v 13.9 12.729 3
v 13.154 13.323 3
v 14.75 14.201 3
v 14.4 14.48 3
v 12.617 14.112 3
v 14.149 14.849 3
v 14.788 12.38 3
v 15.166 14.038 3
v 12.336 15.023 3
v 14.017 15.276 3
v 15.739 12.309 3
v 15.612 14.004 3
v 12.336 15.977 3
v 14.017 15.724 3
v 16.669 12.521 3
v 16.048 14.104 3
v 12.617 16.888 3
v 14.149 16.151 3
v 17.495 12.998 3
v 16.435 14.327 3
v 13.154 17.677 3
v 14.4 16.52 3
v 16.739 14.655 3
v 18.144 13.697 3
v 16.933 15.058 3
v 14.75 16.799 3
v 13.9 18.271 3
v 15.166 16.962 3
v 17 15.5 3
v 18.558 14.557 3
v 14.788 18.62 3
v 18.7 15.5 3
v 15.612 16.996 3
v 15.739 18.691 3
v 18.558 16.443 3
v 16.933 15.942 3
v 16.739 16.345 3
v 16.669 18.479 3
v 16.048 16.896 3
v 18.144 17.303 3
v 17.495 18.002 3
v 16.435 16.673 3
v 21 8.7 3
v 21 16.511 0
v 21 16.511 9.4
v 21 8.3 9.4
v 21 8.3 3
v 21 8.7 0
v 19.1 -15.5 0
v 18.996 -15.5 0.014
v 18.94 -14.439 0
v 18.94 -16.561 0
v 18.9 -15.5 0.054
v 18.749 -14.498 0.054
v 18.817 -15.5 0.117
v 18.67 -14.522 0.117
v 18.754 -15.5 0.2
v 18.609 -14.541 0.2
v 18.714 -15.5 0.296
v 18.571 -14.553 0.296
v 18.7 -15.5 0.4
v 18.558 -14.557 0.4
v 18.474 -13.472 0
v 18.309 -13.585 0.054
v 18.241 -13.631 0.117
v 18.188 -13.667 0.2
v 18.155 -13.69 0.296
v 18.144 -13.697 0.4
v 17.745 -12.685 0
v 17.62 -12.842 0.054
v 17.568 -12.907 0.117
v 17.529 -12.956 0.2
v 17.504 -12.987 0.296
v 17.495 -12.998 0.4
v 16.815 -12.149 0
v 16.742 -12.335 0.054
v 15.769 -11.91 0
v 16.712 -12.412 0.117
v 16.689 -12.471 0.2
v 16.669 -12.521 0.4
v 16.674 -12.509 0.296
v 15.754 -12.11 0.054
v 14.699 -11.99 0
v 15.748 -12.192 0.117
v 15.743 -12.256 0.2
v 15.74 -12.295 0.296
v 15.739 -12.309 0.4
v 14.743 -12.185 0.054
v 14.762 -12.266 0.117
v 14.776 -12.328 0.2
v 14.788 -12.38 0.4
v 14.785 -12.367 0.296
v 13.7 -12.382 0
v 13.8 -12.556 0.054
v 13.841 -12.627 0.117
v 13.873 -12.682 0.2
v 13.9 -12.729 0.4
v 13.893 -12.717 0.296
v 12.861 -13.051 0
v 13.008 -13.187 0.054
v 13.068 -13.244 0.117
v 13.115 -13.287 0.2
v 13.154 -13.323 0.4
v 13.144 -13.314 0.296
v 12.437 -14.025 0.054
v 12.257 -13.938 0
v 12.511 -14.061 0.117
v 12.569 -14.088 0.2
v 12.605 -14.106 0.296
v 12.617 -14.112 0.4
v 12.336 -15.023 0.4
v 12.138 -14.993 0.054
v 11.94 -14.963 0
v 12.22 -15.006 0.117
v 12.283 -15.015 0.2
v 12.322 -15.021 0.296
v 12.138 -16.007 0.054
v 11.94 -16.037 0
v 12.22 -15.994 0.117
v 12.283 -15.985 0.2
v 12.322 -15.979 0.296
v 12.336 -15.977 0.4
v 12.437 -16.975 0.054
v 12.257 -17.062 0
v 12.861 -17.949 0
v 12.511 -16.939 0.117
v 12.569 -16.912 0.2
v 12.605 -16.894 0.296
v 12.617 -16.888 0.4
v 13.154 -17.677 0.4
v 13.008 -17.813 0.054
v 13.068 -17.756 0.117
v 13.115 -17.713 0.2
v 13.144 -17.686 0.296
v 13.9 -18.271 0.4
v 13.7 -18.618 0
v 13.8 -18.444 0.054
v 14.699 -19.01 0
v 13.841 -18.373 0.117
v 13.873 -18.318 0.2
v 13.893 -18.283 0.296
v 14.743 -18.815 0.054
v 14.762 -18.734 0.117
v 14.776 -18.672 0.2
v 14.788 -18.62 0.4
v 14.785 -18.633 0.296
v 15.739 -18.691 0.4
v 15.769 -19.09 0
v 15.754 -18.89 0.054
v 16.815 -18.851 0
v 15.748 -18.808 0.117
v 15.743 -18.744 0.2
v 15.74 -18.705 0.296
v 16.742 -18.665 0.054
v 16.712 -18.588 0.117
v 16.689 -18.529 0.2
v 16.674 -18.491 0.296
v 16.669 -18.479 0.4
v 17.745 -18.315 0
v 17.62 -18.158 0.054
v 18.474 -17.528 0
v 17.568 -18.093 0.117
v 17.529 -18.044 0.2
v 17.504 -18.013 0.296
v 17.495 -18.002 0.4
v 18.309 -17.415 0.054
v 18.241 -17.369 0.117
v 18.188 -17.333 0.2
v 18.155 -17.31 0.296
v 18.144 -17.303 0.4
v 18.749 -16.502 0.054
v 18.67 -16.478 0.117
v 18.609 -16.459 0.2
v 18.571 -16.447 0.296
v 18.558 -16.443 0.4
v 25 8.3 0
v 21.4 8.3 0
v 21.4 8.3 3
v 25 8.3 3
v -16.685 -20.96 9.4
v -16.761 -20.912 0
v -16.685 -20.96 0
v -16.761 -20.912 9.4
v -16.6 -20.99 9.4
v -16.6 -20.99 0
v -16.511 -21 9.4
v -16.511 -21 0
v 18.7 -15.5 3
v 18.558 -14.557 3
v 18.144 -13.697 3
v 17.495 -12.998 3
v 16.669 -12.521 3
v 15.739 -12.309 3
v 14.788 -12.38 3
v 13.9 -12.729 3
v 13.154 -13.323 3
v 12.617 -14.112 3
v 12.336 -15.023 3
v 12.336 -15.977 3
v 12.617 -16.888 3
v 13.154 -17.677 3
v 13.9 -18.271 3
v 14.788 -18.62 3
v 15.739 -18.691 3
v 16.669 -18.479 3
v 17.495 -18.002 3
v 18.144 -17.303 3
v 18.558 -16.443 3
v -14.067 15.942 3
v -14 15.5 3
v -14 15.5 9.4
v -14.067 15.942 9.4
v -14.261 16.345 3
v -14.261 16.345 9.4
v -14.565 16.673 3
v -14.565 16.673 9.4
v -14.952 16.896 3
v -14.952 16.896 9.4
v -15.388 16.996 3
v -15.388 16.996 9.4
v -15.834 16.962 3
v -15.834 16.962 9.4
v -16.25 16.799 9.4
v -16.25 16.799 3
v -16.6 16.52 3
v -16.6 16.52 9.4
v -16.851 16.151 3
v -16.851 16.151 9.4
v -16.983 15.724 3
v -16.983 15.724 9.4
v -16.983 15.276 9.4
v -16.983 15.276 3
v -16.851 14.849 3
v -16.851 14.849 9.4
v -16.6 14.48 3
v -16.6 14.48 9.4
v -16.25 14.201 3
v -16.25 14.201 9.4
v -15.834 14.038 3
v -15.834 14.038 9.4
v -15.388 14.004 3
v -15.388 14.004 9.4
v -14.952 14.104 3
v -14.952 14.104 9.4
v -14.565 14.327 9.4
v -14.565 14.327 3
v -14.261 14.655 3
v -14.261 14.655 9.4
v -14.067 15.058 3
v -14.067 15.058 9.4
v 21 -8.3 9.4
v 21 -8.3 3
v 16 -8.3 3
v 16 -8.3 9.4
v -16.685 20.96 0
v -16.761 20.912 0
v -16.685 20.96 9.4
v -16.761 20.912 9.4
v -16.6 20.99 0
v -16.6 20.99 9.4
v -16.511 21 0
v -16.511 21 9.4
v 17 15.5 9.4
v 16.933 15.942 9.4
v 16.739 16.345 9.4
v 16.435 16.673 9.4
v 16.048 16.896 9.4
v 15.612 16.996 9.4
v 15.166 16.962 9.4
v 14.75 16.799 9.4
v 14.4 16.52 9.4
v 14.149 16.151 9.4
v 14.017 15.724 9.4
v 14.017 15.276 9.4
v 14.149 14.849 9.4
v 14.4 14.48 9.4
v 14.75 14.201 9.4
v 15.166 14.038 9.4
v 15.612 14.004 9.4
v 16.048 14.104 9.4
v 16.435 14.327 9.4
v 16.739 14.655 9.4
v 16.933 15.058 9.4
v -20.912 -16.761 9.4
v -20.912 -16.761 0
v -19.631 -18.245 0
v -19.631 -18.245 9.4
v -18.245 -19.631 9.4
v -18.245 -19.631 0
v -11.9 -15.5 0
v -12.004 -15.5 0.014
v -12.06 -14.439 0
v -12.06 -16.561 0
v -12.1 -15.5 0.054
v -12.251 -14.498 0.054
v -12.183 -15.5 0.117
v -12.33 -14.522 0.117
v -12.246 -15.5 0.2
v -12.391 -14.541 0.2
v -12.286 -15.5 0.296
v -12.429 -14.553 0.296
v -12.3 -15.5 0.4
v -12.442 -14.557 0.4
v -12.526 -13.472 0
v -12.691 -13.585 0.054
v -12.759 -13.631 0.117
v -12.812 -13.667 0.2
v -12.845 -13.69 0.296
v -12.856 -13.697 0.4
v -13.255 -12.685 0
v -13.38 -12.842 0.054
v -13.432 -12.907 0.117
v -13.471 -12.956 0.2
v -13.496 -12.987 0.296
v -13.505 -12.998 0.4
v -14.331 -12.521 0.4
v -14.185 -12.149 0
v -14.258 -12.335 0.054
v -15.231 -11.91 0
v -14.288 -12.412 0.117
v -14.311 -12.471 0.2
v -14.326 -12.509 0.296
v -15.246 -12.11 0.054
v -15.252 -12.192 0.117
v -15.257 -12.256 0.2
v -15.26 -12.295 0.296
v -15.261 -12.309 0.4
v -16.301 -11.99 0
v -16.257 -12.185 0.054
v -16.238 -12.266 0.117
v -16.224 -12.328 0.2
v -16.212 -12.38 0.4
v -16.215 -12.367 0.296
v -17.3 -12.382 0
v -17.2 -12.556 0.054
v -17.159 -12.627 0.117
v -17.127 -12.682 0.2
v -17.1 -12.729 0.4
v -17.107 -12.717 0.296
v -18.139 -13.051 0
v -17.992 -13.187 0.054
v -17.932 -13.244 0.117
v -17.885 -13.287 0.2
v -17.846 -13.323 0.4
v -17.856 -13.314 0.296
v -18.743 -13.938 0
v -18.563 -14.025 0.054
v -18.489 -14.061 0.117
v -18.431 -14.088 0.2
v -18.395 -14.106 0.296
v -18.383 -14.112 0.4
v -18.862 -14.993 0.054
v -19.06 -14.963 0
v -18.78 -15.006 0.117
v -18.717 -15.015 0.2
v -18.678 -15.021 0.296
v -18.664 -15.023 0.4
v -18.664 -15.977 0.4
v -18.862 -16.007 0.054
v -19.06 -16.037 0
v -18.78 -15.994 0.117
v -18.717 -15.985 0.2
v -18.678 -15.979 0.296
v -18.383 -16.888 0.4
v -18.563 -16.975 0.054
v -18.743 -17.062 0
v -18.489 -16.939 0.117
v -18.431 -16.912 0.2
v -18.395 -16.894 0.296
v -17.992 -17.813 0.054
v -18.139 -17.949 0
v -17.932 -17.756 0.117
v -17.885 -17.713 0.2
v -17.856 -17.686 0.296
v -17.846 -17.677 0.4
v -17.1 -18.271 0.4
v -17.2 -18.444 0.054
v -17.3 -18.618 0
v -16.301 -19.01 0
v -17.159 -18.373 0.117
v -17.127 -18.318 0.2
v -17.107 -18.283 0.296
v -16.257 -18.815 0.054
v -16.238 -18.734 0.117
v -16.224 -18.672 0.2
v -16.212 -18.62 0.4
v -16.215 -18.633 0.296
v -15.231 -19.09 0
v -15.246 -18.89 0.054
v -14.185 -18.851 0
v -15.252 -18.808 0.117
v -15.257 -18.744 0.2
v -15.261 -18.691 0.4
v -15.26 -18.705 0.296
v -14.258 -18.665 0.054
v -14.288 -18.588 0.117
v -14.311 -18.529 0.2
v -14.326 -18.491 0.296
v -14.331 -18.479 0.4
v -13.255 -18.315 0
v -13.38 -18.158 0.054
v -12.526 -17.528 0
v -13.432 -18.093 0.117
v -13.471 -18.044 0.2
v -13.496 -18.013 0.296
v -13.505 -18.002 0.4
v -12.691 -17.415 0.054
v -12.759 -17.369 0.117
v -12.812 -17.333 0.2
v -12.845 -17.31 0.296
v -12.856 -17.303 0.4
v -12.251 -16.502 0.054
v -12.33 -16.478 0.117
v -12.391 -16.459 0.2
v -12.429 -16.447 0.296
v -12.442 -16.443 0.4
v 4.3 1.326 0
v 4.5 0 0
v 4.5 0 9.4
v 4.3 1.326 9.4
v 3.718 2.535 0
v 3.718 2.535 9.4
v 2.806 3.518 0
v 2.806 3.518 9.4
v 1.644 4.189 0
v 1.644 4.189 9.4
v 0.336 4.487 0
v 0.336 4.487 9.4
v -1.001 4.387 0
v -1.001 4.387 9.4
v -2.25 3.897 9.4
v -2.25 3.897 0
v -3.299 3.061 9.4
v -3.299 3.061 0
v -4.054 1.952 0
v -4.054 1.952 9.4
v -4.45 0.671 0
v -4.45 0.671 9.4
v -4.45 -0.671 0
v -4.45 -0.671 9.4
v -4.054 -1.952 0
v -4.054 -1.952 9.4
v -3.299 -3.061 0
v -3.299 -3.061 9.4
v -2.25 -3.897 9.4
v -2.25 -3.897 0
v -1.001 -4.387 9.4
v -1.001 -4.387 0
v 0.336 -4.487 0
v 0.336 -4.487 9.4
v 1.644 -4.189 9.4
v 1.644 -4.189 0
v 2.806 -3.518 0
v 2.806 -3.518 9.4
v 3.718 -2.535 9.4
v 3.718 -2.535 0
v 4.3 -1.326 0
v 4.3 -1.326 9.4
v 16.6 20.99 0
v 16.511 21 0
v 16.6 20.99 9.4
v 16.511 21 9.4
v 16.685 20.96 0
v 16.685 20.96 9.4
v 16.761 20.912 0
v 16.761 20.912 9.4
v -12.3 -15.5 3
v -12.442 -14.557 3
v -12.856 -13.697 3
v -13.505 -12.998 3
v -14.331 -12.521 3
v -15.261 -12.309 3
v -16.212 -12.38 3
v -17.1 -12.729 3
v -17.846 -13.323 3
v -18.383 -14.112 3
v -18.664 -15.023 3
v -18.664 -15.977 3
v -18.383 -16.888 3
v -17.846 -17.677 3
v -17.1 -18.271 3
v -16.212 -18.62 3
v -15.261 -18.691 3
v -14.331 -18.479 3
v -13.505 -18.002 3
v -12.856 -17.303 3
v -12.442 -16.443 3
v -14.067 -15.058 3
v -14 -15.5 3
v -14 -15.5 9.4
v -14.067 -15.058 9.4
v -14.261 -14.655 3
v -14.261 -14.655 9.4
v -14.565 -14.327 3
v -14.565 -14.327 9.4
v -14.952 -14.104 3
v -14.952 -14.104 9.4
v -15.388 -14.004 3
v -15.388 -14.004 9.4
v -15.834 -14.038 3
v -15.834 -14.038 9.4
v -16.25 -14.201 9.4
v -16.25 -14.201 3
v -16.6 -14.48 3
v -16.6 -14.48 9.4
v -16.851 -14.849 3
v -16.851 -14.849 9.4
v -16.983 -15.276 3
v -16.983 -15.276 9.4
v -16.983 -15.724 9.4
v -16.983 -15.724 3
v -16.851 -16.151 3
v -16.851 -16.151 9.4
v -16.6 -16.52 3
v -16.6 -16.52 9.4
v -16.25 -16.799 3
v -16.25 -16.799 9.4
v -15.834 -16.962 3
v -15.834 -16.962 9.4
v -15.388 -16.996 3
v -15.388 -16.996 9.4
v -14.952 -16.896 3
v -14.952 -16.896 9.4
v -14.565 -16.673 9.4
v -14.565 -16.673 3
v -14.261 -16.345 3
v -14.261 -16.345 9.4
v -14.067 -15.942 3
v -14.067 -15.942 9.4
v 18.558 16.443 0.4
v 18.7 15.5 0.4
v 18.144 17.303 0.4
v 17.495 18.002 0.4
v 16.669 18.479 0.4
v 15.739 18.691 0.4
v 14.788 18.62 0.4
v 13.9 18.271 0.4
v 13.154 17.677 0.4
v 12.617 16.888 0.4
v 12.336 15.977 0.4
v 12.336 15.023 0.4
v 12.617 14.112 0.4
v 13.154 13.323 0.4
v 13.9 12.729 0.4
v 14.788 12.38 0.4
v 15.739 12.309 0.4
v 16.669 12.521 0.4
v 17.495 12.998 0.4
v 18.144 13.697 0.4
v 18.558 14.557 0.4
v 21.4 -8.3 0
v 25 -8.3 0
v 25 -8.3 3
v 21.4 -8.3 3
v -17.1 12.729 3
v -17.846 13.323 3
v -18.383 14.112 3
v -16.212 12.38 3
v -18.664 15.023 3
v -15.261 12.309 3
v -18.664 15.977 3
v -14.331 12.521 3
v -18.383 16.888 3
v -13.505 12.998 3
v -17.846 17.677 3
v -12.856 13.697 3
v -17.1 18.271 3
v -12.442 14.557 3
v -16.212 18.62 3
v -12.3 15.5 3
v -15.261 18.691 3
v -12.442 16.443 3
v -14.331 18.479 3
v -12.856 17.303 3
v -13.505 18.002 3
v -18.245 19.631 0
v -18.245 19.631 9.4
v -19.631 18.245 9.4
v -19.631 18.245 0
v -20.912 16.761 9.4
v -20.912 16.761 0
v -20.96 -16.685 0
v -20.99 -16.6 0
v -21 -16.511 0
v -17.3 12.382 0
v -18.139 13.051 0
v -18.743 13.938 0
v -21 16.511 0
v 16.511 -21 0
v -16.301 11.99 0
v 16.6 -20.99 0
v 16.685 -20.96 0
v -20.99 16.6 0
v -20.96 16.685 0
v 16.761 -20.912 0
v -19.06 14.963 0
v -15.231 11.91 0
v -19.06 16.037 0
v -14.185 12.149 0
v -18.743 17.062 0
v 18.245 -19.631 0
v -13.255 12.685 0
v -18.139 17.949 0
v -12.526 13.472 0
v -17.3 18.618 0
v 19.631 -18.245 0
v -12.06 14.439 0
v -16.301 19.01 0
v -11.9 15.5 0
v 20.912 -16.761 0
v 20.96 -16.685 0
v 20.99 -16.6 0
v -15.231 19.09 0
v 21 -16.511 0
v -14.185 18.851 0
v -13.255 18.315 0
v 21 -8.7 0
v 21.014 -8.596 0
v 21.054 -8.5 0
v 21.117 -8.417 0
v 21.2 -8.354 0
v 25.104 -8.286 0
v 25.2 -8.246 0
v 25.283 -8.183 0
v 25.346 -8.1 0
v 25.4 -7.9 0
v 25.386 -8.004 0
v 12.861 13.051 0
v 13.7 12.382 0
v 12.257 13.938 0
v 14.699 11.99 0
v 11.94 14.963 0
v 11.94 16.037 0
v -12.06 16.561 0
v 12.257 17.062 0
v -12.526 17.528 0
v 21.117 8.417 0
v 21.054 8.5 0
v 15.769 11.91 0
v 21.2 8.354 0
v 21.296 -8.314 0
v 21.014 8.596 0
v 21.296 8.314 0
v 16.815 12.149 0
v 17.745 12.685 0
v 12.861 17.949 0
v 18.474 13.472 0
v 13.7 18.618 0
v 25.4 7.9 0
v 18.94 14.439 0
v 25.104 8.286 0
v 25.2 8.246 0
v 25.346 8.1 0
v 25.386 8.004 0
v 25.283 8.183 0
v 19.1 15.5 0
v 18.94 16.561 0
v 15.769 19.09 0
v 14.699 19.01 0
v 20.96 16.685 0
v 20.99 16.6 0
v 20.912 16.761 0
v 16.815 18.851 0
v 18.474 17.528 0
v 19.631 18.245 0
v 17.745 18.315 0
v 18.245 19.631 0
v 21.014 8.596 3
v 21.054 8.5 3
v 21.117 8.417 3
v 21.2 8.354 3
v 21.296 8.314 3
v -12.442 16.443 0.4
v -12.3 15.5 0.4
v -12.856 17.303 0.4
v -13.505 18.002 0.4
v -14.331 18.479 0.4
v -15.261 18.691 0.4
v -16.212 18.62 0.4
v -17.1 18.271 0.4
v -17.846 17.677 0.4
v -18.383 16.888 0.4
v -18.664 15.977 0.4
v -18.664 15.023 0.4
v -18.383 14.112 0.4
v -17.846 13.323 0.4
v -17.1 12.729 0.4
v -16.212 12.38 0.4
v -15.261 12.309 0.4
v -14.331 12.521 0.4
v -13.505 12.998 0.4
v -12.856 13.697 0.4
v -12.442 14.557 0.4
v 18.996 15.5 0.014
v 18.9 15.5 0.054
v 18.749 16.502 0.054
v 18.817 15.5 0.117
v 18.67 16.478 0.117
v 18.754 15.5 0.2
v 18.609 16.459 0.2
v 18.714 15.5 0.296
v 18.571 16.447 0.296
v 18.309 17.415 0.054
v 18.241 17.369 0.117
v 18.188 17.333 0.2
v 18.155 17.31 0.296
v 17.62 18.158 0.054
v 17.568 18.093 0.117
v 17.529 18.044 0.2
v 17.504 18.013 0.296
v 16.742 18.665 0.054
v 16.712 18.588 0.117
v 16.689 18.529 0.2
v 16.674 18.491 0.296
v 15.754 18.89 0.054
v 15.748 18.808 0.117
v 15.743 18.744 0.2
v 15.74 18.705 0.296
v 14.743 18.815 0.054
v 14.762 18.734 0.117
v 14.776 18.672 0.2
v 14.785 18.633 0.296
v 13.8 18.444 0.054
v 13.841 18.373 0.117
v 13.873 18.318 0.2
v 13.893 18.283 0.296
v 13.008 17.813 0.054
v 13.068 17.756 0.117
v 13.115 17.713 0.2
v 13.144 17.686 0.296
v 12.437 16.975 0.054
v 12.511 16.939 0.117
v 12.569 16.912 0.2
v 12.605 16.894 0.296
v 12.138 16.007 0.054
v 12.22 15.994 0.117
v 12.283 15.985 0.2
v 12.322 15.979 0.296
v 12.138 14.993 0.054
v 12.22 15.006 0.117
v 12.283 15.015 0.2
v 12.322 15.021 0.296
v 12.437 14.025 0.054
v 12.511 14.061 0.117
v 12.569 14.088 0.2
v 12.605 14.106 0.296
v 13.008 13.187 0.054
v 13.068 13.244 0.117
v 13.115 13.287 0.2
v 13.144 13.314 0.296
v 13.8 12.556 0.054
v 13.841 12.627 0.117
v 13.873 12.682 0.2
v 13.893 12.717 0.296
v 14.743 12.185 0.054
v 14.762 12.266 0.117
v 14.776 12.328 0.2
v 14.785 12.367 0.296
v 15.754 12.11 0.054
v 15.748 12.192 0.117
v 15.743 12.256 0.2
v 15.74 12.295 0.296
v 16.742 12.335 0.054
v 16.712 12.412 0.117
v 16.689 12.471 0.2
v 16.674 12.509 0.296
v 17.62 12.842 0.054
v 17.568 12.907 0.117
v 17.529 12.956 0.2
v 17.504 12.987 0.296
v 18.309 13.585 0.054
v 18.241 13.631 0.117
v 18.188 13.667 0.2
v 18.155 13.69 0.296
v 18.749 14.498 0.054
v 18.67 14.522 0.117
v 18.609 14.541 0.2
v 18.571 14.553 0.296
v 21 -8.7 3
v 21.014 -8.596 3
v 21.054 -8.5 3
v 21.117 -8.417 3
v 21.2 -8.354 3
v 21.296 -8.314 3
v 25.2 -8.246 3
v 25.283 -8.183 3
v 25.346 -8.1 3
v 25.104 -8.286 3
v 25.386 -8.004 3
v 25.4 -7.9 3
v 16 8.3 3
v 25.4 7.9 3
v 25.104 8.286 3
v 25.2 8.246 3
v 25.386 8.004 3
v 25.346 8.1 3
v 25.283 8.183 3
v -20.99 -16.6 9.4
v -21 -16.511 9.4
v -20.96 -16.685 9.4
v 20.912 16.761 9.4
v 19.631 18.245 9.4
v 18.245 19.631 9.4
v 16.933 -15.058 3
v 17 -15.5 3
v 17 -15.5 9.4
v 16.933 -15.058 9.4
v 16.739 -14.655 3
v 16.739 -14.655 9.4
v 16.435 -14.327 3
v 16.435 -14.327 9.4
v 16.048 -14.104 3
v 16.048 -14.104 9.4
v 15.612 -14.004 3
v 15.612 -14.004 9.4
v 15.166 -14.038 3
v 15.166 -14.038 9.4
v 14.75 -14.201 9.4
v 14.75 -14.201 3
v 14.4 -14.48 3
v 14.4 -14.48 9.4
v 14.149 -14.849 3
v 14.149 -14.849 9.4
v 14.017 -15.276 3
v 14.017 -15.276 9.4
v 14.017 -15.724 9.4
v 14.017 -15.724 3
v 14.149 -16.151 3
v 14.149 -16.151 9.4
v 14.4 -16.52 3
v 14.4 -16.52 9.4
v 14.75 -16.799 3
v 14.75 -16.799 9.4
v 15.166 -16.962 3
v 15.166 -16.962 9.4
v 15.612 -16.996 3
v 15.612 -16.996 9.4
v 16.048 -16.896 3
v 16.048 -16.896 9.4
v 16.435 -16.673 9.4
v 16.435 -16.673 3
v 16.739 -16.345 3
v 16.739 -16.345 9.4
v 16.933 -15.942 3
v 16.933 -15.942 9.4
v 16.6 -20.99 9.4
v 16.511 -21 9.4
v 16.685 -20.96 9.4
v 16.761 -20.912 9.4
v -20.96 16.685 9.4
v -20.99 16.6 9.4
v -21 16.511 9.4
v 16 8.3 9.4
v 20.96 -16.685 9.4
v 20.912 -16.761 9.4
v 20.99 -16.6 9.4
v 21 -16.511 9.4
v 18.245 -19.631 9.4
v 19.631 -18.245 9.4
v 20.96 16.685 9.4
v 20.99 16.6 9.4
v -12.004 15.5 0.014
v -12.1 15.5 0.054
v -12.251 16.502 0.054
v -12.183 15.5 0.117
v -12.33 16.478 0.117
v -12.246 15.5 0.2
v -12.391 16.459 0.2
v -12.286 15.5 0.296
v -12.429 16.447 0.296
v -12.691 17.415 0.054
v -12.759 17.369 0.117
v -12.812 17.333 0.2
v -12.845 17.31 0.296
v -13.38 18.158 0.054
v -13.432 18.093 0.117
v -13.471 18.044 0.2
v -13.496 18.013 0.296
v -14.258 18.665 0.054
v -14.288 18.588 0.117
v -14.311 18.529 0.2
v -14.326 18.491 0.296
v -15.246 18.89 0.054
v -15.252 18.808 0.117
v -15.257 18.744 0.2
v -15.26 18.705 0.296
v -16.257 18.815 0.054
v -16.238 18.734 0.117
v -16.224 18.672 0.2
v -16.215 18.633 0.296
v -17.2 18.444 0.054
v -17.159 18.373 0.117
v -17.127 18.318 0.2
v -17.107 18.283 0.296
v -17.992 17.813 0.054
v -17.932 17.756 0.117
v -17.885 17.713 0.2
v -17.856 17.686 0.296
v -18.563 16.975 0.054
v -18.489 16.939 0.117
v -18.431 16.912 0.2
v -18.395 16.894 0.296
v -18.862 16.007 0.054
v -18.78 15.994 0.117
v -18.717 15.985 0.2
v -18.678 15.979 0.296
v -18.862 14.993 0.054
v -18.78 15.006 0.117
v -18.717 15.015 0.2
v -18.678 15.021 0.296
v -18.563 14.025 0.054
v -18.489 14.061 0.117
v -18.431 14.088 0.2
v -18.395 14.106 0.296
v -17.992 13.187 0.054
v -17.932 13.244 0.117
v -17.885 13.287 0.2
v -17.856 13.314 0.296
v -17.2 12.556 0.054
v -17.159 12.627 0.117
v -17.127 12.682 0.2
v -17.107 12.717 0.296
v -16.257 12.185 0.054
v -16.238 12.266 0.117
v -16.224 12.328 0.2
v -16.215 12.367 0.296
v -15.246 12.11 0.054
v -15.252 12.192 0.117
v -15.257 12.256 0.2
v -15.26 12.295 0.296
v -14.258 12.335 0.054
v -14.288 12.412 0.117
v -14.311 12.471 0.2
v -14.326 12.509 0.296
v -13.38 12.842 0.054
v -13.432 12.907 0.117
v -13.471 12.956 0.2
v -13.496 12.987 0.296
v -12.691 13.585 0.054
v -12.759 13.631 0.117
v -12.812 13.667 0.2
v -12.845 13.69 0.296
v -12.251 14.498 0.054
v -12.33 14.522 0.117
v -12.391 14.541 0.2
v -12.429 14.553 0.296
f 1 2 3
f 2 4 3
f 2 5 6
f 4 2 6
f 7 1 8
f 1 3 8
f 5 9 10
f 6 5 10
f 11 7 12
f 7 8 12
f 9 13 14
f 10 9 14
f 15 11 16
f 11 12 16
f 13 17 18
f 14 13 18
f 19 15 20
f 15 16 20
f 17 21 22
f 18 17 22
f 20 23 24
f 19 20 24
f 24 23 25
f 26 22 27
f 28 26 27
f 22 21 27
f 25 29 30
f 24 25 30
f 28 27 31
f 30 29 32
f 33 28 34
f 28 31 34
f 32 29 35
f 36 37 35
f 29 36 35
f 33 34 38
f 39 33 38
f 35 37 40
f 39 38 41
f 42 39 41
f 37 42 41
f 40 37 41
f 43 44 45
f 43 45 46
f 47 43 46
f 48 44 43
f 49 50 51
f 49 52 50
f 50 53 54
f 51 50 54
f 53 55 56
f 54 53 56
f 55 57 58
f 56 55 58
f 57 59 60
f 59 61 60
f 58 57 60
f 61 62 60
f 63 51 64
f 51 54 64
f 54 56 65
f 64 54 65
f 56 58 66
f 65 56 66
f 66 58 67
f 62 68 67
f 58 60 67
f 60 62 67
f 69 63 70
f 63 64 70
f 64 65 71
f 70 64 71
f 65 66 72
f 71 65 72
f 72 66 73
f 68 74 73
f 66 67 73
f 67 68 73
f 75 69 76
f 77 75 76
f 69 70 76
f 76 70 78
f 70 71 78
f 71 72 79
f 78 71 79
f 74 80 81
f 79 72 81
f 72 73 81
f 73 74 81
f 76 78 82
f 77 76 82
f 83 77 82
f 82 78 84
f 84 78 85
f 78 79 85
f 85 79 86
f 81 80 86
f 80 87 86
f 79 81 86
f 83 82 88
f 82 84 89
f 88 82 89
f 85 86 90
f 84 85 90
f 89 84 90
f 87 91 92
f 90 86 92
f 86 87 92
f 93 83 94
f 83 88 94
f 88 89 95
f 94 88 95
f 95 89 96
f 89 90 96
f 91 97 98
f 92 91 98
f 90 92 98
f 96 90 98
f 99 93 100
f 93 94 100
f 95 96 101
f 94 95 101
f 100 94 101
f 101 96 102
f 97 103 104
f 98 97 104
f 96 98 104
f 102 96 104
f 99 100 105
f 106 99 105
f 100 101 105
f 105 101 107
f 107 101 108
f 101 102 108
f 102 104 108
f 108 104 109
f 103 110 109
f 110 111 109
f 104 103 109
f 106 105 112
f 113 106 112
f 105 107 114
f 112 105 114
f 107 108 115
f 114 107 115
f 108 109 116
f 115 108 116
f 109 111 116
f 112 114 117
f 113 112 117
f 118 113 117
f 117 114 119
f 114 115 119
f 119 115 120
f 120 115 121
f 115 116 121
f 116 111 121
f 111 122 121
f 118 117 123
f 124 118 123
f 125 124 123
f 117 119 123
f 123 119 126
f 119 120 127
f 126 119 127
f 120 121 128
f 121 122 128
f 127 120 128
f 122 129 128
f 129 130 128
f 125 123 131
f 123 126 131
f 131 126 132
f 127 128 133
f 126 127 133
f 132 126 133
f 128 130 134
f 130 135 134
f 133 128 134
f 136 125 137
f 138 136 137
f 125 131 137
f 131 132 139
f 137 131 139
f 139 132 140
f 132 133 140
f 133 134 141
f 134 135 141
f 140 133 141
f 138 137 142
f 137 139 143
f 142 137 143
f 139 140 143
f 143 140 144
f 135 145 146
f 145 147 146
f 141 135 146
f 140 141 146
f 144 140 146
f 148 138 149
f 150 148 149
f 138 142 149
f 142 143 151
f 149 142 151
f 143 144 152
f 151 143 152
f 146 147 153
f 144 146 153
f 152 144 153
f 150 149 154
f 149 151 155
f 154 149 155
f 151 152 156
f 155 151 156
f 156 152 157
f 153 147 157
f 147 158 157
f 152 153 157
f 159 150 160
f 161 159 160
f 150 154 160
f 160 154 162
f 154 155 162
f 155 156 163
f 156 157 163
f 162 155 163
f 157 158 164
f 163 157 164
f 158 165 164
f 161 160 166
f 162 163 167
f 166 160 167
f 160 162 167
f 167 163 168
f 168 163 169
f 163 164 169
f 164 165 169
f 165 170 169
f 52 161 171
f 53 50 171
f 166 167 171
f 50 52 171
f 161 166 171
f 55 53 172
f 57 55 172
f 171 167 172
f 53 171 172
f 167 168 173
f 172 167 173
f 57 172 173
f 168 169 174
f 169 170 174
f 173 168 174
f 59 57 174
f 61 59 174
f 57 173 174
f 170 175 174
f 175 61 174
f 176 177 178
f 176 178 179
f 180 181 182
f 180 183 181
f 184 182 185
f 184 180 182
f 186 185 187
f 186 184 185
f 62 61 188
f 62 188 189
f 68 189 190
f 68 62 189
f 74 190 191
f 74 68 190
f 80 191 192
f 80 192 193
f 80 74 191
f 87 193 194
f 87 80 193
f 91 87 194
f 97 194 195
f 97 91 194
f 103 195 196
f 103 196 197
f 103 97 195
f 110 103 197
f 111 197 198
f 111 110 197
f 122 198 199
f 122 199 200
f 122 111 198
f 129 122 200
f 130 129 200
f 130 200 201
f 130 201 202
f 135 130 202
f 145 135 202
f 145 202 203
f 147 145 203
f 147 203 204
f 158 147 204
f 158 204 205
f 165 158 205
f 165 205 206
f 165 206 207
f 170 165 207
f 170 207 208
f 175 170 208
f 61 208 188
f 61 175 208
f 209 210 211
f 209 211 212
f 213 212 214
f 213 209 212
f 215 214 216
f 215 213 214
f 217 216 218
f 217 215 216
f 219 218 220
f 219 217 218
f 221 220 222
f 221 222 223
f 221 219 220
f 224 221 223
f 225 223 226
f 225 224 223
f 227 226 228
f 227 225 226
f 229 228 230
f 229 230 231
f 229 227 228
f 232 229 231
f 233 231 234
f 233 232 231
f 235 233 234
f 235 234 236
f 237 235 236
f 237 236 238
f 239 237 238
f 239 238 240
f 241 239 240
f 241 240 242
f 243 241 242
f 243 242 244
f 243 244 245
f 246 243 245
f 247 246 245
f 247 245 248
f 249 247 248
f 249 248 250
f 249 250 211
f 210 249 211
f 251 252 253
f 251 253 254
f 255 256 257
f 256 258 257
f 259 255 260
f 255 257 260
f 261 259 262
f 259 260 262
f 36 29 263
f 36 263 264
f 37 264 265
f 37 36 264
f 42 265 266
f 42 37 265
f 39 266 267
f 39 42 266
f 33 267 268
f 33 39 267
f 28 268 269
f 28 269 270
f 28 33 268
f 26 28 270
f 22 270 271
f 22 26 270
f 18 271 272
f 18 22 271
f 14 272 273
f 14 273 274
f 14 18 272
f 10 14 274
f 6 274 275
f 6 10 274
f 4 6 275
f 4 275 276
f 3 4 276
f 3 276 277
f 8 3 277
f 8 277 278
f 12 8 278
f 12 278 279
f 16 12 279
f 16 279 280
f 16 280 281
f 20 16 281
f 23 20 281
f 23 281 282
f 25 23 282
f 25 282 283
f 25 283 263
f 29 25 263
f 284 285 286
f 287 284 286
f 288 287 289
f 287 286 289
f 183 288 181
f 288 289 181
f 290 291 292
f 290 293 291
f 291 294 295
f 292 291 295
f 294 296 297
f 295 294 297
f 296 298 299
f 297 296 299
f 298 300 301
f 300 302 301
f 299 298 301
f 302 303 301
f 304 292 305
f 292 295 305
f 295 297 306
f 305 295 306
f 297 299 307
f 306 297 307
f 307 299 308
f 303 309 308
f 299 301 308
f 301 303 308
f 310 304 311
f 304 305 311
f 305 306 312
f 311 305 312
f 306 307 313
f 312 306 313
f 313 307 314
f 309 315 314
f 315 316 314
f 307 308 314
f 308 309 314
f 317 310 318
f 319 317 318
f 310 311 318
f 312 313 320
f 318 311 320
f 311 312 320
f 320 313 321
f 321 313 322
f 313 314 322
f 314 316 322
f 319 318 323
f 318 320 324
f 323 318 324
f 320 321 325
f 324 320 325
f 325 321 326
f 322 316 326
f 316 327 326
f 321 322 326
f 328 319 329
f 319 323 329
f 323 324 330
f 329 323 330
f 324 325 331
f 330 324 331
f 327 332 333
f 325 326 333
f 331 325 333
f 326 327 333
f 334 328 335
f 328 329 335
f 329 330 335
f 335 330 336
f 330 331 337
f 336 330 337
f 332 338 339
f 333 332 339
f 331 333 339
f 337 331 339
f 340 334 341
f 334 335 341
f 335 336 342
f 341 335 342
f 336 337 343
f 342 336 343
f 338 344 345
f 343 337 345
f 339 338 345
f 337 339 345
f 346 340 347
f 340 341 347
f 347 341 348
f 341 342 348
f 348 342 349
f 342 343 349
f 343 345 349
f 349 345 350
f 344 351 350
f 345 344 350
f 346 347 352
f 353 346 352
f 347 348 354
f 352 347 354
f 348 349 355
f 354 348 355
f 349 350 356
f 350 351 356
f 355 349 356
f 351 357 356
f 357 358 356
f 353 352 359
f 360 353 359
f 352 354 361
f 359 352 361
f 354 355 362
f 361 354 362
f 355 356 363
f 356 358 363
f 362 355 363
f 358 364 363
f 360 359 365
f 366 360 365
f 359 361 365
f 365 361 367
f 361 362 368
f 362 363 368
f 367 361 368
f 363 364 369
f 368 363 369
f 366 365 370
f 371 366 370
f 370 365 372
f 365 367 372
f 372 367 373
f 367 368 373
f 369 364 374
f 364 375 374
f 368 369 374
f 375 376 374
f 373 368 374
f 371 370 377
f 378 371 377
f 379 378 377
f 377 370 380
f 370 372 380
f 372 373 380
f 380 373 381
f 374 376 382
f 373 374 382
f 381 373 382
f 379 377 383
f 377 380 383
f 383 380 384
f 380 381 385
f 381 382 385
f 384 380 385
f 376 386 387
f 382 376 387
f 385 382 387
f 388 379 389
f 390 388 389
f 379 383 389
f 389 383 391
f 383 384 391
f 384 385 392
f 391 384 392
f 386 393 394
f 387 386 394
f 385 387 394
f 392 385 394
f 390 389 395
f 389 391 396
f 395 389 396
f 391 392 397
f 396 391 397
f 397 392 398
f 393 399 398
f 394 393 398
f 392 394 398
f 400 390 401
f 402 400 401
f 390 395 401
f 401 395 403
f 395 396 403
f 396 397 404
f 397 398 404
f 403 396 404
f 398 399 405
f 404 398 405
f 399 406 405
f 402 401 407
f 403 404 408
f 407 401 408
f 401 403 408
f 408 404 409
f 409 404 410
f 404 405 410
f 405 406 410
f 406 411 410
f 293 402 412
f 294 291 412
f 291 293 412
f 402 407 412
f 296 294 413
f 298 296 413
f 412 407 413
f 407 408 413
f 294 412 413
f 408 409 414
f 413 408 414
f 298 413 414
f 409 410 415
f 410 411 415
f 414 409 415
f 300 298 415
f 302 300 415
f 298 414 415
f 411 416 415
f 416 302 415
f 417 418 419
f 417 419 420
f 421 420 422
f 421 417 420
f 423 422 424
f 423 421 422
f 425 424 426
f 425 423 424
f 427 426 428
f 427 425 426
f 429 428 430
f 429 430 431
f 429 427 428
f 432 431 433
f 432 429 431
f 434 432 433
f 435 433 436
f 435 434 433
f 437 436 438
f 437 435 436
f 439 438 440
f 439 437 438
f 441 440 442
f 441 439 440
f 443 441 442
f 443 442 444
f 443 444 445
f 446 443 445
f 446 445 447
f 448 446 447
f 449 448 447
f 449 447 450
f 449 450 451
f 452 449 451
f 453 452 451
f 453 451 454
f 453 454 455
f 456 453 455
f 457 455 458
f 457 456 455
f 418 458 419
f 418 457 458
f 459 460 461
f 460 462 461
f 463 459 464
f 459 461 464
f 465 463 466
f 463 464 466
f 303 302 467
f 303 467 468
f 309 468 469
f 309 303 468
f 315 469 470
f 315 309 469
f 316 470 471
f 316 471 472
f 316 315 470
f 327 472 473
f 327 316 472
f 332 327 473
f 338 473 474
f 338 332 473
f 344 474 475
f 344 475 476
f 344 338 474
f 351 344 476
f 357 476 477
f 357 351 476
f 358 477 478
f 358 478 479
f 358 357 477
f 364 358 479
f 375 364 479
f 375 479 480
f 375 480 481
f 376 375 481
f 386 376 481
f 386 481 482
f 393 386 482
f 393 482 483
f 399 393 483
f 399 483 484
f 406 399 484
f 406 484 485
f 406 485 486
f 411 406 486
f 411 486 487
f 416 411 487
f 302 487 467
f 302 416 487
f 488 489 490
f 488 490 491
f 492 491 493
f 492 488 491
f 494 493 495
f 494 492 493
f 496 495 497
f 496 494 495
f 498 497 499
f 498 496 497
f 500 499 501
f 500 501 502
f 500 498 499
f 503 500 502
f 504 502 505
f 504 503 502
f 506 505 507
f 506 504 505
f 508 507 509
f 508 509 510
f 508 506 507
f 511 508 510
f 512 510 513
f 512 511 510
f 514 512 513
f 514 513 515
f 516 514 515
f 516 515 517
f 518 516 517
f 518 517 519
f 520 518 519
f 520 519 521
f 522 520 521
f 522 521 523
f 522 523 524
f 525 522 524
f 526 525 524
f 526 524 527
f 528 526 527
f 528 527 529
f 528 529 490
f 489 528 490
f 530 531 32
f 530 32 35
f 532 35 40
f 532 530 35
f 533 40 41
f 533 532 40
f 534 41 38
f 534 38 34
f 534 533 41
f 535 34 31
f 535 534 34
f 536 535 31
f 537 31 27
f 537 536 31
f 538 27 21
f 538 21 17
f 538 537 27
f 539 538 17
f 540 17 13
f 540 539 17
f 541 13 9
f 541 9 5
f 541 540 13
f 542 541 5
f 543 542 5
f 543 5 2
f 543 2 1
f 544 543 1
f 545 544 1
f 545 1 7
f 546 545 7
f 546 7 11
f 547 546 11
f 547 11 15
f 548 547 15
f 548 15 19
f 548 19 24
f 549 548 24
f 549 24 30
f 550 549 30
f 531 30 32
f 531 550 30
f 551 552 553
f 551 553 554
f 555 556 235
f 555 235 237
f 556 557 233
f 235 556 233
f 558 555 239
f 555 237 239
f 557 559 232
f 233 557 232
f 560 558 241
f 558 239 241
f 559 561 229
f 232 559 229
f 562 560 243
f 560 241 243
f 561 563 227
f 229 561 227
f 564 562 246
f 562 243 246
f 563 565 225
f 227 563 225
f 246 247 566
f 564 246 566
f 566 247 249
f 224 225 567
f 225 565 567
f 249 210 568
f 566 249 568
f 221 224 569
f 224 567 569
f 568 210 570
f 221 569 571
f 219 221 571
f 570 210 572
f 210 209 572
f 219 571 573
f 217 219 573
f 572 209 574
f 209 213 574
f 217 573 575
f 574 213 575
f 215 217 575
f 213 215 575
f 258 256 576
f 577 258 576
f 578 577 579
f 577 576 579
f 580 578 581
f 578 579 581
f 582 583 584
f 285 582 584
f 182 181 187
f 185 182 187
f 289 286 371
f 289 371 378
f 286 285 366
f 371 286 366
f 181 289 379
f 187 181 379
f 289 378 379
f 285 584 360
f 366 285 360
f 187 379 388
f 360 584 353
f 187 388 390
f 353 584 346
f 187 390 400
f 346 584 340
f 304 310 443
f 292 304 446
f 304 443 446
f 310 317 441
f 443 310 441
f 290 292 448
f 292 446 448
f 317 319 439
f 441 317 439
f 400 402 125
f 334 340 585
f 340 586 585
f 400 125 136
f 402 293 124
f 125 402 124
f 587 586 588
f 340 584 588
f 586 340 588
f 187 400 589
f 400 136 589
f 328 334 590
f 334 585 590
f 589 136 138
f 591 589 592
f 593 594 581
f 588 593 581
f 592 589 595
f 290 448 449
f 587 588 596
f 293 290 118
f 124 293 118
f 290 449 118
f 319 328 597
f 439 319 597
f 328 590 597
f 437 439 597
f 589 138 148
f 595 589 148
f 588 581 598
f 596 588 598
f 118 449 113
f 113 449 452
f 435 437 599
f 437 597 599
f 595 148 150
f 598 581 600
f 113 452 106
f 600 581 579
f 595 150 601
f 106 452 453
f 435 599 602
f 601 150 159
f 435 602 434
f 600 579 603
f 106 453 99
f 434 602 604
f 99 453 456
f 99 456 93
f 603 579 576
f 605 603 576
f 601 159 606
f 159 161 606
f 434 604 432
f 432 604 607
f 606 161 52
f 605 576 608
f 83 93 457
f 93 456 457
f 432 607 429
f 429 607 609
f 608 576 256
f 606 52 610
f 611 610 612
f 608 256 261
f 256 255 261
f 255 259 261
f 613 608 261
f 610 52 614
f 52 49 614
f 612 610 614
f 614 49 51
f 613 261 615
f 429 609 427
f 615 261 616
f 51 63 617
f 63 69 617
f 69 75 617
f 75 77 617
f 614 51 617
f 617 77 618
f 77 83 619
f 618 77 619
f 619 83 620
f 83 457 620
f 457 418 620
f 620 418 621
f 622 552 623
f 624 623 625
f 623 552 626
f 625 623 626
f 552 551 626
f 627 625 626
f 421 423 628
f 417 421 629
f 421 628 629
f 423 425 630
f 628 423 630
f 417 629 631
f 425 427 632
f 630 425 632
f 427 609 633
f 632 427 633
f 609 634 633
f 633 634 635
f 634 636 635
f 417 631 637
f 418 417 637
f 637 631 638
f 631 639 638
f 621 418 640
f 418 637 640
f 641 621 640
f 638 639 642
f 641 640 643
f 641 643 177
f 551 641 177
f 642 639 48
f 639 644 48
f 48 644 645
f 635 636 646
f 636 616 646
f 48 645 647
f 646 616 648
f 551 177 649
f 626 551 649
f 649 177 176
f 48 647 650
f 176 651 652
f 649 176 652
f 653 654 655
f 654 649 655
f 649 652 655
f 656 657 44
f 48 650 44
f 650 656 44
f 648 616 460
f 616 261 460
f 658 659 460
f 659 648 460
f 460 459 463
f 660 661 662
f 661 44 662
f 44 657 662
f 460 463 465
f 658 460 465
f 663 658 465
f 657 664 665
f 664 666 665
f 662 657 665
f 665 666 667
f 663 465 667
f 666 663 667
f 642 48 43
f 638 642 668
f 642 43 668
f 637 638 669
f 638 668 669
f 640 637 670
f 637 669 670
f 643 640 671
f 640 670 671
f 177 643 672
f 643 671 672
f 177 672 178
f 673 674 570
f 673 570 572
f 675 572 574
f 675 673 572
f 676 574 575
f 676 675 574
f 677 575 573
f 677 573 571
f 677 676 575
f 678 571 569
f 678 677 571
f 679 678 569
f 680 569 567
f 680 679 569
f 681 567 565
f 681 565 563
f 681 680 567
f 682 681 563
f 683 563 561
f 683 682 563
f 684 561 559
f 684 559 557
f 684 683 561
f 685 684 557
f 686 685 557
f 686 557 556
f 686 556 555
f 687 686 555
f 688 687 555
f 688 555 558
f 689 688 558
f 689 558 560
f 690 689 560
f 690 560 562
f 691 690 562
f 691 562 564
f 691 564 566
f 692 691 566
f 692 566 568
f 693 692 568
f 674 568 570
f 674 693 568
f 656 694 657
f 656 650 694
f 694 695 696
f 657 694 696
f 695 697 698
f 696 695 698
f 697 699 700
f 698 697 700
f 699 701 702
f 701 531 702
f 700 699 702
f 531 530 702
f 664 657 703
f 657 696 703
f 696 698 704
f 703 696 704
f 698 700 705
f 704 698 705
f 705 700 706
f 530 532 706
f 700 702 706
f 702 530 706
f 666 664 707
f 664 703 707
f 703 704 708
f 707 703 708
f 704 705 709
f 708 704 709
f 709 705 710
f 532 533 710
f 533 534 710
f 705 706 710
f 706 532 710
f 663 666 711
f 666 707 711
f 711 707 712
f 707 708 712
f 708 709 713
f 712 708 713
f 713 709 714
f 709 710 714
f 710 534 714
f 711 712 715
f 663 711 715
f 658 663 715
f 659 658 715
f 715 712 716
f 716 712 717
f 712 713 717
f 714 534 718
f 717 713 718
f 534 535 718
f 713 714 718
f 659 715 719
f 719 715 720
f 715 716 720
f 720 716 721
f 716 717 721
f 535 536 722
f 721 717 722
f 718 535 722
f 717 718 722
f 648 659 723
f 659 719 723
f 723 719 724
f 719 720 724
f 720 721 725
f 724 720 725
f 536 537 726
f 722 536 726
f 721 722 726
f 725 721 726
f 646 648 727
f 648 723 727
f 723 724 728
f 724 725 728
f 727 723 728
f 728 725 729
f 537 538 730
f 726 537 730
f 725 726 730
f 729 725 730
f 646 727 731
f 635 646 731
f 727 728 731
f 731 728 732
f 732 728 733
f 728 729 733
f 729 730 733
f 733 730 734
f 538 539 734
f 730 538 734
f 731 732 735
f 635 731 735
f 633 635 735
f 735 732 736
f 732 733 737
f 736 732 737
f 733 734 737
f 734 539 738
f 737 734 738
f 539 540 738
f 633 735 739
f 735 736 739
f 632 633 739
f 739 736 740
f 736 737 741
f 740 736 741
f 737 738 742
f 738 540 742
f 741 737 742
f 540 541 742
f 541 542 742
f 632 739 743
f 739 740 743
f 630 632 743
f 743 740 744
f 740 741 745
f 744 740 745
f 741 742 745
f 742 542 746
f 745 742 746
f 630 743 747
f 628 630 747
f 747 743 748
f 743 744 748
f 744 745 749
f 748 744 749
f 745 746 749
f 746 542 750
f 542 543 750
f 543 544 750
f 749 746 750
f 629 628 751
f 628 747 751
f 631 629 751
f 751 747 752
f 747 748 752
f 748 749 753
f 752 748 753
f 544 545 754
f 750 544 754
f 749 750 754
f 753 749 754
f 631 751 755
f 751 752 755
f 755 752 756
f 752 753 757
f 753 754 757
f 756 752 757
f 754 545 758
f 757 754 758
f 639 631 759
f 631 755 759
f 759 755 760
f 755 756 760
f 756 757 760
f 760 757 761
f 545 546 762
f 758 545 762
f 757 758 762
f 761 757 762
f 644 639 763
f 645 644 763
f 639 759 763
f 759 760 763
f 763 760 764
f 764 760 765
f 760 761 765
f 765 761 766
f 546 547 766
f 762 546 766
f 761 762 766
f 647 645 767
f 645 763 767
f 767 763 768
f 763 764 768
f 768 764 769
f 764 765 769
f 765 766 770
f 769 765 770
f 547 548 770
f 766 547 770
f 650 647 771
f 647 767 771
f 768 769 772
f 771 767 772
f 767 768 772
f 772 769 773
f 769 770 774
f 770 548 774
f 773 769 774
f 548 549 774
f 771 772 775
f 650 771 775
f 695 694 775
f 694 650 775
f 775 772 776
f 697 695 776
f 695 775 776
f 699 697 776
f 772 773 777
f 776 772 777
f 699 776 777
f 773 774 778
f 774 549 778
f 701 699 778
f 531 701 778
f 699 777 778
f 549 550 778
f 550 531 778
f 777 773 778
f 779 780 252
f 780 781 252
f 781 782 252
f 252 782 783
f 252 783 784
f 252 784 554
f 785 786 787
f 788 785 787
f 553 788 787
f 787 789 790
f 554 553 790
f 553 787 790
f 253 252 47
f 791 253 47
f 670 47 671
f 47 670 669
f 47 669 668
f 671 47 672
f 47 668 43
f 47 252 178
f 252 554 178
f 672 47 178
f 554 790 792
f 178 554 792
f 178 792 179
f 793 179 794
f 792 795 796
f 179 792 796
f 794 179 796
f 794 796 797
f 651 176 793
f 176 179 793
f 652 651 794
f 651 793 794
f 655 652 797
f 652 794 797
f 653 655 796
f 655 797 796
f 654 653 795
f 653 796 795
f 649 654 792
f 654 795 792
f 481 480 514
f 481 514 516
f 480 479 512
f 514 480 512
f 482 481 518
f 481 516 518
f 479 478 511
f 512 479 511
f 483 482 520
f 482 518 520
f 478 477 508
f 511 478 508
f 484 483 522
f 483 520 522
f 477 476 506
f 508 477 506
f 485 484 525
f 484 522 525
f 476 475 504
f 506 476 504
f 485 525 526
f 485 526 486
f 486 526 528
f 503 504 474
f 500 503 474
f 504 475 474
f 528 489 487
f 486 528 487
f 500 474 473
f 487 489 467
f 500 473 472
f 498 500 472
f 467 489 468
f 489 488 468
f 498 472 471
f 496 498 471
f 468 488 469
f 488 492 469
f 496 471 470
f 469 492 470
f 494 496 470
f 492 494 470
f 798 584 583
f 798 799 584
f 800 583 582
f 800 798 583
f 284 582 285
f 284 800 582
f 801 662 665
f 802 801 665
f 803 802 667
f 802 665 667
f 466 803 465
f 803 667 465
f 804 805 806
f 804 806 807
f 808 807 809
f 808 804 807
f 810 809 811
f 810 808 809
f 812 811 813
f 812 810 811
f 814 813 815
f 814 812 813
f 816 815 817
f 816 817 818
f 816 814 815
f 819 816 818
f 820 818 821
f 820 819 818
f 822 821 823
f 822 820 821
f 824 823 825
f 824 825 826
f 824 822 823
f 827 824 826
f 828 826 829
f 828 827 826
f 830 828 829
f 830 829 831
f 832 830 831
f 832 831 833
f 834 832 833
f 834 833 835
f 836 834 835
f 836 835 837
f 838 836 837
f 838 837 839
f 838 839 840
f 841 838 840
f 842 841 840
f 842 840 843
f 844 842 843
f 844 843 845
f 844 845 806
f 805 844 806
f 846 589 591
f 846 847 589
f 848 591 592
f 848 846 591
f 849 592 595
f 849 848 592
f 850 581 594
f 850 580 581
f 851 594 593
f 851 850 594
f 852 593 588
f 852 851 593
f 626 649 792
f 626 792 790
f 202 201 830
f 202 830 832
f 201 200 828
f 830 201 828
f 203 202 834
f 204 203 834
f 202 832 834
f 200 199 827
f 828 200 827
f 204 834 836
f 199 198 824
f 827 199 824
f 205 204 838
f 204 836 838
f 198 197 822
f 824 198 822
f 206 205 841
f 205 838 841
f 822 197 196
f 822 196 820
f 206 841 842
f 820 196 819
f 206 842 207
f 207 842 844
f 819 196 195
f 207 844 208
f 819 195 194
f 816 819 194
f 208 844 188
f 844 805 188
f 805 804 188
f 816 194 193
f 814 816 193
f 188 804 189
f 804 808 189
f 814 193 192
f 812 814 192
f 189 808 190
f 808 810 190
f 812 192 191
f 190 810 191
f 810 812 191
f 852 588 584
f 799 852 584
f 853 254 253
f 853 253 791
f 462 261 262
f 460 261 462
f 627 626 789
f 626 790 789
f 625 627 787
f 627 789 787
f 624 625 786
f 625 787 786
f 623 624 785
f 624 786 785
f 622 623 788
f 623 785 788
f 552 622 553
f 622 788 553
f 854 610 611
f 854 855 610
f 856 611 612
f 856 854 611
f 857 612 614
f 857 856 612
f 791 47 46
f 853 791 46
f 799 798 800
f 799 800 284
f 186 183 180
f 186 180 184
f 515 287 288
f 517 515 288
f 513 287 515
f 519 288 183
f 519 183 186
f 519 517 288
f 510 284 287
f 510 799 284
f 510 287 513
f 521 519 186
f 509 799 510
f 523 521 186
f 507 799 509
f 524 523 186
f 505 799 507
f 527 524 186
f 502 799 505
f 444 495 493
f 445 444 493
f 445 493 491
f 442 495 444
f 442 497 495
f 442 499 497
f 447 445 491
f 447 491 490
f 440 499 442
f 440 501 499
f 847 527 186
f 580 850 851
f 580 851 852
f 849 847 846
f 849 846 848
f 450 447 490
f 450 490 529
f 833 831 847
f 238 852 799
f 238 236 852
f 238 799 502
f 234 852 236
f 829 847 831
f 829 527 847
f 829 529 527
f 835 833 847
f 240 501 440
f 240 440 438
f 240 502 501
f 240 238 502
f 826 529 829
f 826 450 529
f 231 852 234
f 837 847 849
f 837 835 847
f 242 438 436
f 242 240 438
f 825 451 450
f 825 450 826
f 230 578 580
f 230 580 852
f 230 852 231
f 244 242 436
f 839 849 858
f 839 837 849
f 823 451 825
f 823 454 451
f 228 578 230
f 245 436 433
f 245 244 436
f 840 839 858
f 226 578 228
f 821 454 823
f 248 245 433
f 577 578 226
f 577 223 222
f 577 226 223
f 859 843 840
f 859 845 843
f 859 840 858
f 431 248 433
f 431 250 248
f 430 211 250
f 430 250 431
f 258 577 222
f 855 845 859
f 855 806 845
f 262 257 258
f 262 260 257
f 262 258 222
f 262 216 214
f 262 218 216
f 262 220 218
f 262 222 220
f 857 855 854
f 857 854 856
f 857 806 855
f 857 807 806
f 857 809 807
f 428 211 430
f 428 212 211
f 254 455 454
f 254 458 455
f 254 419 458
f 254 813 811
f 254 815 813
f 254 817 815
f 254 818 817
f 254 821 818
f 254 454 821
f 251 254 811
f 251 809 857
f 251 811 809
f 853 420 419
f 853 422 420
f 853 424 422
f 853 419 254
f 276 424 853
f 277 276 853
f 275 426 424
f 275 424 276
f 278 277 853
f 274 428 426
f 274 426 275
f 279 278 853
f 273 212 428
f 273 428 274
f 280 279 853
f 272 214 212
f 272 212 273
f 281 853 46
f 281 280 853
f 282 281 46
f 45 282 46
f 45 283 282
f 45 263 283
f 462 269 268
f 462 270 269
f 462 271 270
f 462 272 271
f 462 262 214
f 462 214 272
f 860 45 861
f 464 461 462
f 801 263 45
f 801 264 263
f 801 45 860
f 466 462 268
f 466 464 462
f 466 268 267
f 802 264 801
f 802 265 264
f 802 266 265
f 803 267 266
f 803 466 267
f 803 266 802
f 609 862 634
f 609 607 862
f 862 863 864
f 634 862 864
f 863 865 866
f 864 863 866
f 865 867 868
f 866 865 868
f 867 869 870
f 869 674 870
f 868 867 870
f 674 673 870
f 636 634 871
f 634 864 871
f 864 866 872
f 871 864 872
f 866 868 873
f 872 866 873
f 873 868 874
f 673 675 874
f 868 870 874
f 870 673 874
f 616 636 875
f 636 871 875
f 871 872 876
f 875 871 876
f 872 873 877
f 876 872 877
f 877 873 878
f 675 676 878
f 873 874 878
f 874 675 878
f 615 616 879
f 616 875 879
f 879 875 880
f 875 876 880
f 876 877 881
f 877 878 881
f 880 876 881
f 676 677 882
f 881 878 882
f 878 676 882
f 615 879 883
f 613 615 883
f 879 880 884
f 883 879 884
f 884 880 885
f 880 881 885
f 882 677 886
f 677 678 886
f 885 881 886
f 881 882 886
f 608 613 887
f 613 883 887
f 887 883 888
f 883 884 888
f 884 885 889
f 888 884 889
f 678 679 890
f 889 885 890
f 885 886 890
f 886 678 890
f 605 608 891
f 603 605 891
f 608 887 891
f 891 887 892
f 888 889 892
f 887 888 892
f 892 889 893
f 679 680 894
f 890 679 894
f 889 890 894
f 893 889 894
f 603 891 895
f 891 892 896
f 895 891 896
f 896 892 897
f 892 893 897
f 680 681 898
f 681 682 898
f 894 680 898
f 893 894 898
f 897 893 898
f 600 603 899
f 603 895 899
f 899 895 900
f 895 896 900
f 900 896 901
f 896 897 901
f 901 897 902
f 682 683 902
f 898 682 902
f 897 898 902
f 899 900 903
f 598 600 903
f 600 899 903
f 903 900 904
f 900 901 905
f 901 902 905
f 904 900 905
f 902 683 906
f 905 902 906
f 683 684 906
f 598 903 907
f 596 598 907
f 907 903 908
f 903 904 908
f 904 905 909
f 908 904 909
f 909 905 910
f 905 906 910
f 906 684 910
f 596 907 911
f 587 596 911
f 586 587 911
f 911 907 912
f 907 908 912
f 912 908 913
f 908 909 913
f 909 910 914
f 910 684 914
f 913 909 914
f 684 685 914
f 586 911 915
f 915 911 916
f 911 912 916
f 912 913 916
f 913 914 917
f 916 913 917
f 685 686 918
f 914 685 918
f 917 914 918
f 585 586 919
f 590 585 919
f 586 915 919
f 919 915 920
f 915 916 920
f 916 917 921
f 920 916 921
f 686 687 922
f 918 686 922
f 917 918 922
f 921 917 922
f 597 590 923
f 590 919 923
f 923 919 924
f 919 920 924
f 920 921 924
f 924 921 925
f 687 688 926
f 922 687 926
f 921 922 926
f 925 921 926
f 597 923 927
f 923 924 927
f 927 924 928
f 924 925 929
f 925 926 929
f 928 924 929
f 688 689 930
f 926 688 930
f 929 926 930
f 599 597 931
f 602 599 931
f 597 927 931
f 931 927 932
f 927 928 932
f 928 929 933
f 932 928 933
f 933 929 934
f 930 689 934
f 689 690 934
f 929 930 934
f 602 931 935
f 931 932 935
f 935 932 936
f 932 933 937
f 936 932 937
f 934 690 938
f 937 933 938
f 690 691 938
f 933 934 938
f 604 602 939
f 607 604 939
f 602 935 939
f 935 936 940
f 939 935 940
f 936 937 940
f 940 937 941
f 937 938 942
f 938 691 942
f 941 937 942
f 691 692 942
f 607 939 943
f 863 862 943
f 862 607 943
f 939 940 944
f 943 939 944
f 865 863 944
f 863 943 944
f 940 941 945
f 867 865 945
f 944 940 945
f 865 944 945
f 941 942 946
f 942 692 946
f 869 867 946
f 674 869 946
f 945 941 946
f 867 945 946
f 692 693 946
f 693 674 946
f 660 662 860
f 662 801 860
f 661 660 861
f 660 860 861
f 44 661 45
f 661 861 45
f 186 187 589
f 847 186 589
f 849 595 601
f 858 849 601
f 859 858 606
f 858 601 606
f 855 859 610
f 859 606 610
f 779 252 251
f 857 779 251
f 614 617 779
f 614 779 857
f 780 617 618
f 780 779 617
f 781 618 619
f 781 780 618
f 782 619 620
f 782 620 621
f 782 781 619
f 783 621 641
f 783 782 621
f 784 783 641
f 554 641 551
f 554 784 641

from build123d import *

# Parameters (mm, degrees)
SKETCH_R        = 4.5
SKETCH_R_2      = 1.5
PAD_DEPTH       = 9.4
SKETCH002_R     = 3.2
POCKET_DEPTH    = 3
SKETCH004_W     = 16.6
SKETCH004_H     = 6.4
POCKET002_DEPTH = 10
FILLET_R        = 0.4


with BuildPart() as part:
    # Sketch → Pad (new body)
    with BuildSketch(Plane.XY):
        with BuildLine():
            ThreePointArc((-16.650526, 21), (-18.950462, 18.950462), (-21, 16.650526))
            Line((-21, 16.650526), (-21, -16.650526))
            ThreePointArc((-21, -16.650526), (-18.950462, -18.950462), (-16.650526, -21))
            Line((-16.650526, -21), (16.650526, -21))
            ThreePointArc((16.650526, -21), (18.950462, -18.950462), (21, -16.650526))
            Line((21, -8.3), (21, -16.650526))
            Line((25.4, -8.3), (21, -8.3))
            Line((25.4, 8.3), (25.4, -8.3))
            Line((21, 8.3), (25.4, 8.3))
            Line((21, 16.650526), (21, 8.3))
            ThreePointArc((21, 16.650526), (18.950462, 18.950462), (16.650526, 21))
            Line((-16.650526, 21), (16.650526, 21))
        make_face()
        Circle(SKETCH_R, mode=Mode.SUBTRACT)
        with Locations((-15.5, 15.5)):
            Circle(SKETCH_R_2, mode=Mode.SUBTRACT)
        with Locations((15.5, 15.5)):
            Circle(SKETCH_R_2, mode=Mode.SUBTRACT)
        with Locations((15.5, -15.5)):
            Circle(SKETCH_R_2, mode=Mode.SUBTRACT)
        with Locations((-15.5, -15.5)):
            Circle(SKETCH_R_2, mode=Mode.SUBTRACT)
    extrude(amount=PAD_DEPTH)

    # Sketch002 → Pocket (cut)
    with BuildSketch(Plane.XY):
        with Locations((-15.5, 15.5)):
            Circle(SKETCH002_R)
        with Locations((15.5, 15.5)):
            Circle(SKETCH002_R)
        with Locations((15.5, -15.5)):
            Circle(SKETCH002_R)
        with Locations((-15.5, -15.5)):
            Circle(SKETCH002_R)
    extrude(amount=POCKET_DEPTH, mode=Mode.SUBTRACT)

    # Sketch004 → Pocket002 (cut)
    with BuildSketch(Plane.YZ.offset(26)):
        with Locations((0, 6.2)):
            Rectangle(SKETCH004_W, SKETCH004_H)
    extrude(amount=-POCKET002_DEPTH, mode=Mode.SUBTRACT)

    # Fillet
    fillet_edges = [part.edges().sort_by_distance(p)[0] for p in [
        (21, -8.3, 1.5),
        (21, 8.3, 1.5),
        (25.4, 8.3, 1.5),
        (25.4, -8.3, 1.5),
        (21, -16.650526, 4.7),
        (16.650526, -21, 4.7),
        (-16.650526, -21, 4.7),
        (-21, -16.650526, 4.7),
        (-21, 16.650526, 4.7),
        (-16.650526, 21, 4.7),
        (16.650526, 21, 4.7),
        (21, 16.650526, 4.7),
        (-18.7, 15.5, 0),
        (-18.7, -15.5, 0),
        (12.3, -15.5, 0),
        (12.3, 15.5, 0),
    ]]
    fillet(fillet_edges, radius=FILLET_R)


solid = part.part
